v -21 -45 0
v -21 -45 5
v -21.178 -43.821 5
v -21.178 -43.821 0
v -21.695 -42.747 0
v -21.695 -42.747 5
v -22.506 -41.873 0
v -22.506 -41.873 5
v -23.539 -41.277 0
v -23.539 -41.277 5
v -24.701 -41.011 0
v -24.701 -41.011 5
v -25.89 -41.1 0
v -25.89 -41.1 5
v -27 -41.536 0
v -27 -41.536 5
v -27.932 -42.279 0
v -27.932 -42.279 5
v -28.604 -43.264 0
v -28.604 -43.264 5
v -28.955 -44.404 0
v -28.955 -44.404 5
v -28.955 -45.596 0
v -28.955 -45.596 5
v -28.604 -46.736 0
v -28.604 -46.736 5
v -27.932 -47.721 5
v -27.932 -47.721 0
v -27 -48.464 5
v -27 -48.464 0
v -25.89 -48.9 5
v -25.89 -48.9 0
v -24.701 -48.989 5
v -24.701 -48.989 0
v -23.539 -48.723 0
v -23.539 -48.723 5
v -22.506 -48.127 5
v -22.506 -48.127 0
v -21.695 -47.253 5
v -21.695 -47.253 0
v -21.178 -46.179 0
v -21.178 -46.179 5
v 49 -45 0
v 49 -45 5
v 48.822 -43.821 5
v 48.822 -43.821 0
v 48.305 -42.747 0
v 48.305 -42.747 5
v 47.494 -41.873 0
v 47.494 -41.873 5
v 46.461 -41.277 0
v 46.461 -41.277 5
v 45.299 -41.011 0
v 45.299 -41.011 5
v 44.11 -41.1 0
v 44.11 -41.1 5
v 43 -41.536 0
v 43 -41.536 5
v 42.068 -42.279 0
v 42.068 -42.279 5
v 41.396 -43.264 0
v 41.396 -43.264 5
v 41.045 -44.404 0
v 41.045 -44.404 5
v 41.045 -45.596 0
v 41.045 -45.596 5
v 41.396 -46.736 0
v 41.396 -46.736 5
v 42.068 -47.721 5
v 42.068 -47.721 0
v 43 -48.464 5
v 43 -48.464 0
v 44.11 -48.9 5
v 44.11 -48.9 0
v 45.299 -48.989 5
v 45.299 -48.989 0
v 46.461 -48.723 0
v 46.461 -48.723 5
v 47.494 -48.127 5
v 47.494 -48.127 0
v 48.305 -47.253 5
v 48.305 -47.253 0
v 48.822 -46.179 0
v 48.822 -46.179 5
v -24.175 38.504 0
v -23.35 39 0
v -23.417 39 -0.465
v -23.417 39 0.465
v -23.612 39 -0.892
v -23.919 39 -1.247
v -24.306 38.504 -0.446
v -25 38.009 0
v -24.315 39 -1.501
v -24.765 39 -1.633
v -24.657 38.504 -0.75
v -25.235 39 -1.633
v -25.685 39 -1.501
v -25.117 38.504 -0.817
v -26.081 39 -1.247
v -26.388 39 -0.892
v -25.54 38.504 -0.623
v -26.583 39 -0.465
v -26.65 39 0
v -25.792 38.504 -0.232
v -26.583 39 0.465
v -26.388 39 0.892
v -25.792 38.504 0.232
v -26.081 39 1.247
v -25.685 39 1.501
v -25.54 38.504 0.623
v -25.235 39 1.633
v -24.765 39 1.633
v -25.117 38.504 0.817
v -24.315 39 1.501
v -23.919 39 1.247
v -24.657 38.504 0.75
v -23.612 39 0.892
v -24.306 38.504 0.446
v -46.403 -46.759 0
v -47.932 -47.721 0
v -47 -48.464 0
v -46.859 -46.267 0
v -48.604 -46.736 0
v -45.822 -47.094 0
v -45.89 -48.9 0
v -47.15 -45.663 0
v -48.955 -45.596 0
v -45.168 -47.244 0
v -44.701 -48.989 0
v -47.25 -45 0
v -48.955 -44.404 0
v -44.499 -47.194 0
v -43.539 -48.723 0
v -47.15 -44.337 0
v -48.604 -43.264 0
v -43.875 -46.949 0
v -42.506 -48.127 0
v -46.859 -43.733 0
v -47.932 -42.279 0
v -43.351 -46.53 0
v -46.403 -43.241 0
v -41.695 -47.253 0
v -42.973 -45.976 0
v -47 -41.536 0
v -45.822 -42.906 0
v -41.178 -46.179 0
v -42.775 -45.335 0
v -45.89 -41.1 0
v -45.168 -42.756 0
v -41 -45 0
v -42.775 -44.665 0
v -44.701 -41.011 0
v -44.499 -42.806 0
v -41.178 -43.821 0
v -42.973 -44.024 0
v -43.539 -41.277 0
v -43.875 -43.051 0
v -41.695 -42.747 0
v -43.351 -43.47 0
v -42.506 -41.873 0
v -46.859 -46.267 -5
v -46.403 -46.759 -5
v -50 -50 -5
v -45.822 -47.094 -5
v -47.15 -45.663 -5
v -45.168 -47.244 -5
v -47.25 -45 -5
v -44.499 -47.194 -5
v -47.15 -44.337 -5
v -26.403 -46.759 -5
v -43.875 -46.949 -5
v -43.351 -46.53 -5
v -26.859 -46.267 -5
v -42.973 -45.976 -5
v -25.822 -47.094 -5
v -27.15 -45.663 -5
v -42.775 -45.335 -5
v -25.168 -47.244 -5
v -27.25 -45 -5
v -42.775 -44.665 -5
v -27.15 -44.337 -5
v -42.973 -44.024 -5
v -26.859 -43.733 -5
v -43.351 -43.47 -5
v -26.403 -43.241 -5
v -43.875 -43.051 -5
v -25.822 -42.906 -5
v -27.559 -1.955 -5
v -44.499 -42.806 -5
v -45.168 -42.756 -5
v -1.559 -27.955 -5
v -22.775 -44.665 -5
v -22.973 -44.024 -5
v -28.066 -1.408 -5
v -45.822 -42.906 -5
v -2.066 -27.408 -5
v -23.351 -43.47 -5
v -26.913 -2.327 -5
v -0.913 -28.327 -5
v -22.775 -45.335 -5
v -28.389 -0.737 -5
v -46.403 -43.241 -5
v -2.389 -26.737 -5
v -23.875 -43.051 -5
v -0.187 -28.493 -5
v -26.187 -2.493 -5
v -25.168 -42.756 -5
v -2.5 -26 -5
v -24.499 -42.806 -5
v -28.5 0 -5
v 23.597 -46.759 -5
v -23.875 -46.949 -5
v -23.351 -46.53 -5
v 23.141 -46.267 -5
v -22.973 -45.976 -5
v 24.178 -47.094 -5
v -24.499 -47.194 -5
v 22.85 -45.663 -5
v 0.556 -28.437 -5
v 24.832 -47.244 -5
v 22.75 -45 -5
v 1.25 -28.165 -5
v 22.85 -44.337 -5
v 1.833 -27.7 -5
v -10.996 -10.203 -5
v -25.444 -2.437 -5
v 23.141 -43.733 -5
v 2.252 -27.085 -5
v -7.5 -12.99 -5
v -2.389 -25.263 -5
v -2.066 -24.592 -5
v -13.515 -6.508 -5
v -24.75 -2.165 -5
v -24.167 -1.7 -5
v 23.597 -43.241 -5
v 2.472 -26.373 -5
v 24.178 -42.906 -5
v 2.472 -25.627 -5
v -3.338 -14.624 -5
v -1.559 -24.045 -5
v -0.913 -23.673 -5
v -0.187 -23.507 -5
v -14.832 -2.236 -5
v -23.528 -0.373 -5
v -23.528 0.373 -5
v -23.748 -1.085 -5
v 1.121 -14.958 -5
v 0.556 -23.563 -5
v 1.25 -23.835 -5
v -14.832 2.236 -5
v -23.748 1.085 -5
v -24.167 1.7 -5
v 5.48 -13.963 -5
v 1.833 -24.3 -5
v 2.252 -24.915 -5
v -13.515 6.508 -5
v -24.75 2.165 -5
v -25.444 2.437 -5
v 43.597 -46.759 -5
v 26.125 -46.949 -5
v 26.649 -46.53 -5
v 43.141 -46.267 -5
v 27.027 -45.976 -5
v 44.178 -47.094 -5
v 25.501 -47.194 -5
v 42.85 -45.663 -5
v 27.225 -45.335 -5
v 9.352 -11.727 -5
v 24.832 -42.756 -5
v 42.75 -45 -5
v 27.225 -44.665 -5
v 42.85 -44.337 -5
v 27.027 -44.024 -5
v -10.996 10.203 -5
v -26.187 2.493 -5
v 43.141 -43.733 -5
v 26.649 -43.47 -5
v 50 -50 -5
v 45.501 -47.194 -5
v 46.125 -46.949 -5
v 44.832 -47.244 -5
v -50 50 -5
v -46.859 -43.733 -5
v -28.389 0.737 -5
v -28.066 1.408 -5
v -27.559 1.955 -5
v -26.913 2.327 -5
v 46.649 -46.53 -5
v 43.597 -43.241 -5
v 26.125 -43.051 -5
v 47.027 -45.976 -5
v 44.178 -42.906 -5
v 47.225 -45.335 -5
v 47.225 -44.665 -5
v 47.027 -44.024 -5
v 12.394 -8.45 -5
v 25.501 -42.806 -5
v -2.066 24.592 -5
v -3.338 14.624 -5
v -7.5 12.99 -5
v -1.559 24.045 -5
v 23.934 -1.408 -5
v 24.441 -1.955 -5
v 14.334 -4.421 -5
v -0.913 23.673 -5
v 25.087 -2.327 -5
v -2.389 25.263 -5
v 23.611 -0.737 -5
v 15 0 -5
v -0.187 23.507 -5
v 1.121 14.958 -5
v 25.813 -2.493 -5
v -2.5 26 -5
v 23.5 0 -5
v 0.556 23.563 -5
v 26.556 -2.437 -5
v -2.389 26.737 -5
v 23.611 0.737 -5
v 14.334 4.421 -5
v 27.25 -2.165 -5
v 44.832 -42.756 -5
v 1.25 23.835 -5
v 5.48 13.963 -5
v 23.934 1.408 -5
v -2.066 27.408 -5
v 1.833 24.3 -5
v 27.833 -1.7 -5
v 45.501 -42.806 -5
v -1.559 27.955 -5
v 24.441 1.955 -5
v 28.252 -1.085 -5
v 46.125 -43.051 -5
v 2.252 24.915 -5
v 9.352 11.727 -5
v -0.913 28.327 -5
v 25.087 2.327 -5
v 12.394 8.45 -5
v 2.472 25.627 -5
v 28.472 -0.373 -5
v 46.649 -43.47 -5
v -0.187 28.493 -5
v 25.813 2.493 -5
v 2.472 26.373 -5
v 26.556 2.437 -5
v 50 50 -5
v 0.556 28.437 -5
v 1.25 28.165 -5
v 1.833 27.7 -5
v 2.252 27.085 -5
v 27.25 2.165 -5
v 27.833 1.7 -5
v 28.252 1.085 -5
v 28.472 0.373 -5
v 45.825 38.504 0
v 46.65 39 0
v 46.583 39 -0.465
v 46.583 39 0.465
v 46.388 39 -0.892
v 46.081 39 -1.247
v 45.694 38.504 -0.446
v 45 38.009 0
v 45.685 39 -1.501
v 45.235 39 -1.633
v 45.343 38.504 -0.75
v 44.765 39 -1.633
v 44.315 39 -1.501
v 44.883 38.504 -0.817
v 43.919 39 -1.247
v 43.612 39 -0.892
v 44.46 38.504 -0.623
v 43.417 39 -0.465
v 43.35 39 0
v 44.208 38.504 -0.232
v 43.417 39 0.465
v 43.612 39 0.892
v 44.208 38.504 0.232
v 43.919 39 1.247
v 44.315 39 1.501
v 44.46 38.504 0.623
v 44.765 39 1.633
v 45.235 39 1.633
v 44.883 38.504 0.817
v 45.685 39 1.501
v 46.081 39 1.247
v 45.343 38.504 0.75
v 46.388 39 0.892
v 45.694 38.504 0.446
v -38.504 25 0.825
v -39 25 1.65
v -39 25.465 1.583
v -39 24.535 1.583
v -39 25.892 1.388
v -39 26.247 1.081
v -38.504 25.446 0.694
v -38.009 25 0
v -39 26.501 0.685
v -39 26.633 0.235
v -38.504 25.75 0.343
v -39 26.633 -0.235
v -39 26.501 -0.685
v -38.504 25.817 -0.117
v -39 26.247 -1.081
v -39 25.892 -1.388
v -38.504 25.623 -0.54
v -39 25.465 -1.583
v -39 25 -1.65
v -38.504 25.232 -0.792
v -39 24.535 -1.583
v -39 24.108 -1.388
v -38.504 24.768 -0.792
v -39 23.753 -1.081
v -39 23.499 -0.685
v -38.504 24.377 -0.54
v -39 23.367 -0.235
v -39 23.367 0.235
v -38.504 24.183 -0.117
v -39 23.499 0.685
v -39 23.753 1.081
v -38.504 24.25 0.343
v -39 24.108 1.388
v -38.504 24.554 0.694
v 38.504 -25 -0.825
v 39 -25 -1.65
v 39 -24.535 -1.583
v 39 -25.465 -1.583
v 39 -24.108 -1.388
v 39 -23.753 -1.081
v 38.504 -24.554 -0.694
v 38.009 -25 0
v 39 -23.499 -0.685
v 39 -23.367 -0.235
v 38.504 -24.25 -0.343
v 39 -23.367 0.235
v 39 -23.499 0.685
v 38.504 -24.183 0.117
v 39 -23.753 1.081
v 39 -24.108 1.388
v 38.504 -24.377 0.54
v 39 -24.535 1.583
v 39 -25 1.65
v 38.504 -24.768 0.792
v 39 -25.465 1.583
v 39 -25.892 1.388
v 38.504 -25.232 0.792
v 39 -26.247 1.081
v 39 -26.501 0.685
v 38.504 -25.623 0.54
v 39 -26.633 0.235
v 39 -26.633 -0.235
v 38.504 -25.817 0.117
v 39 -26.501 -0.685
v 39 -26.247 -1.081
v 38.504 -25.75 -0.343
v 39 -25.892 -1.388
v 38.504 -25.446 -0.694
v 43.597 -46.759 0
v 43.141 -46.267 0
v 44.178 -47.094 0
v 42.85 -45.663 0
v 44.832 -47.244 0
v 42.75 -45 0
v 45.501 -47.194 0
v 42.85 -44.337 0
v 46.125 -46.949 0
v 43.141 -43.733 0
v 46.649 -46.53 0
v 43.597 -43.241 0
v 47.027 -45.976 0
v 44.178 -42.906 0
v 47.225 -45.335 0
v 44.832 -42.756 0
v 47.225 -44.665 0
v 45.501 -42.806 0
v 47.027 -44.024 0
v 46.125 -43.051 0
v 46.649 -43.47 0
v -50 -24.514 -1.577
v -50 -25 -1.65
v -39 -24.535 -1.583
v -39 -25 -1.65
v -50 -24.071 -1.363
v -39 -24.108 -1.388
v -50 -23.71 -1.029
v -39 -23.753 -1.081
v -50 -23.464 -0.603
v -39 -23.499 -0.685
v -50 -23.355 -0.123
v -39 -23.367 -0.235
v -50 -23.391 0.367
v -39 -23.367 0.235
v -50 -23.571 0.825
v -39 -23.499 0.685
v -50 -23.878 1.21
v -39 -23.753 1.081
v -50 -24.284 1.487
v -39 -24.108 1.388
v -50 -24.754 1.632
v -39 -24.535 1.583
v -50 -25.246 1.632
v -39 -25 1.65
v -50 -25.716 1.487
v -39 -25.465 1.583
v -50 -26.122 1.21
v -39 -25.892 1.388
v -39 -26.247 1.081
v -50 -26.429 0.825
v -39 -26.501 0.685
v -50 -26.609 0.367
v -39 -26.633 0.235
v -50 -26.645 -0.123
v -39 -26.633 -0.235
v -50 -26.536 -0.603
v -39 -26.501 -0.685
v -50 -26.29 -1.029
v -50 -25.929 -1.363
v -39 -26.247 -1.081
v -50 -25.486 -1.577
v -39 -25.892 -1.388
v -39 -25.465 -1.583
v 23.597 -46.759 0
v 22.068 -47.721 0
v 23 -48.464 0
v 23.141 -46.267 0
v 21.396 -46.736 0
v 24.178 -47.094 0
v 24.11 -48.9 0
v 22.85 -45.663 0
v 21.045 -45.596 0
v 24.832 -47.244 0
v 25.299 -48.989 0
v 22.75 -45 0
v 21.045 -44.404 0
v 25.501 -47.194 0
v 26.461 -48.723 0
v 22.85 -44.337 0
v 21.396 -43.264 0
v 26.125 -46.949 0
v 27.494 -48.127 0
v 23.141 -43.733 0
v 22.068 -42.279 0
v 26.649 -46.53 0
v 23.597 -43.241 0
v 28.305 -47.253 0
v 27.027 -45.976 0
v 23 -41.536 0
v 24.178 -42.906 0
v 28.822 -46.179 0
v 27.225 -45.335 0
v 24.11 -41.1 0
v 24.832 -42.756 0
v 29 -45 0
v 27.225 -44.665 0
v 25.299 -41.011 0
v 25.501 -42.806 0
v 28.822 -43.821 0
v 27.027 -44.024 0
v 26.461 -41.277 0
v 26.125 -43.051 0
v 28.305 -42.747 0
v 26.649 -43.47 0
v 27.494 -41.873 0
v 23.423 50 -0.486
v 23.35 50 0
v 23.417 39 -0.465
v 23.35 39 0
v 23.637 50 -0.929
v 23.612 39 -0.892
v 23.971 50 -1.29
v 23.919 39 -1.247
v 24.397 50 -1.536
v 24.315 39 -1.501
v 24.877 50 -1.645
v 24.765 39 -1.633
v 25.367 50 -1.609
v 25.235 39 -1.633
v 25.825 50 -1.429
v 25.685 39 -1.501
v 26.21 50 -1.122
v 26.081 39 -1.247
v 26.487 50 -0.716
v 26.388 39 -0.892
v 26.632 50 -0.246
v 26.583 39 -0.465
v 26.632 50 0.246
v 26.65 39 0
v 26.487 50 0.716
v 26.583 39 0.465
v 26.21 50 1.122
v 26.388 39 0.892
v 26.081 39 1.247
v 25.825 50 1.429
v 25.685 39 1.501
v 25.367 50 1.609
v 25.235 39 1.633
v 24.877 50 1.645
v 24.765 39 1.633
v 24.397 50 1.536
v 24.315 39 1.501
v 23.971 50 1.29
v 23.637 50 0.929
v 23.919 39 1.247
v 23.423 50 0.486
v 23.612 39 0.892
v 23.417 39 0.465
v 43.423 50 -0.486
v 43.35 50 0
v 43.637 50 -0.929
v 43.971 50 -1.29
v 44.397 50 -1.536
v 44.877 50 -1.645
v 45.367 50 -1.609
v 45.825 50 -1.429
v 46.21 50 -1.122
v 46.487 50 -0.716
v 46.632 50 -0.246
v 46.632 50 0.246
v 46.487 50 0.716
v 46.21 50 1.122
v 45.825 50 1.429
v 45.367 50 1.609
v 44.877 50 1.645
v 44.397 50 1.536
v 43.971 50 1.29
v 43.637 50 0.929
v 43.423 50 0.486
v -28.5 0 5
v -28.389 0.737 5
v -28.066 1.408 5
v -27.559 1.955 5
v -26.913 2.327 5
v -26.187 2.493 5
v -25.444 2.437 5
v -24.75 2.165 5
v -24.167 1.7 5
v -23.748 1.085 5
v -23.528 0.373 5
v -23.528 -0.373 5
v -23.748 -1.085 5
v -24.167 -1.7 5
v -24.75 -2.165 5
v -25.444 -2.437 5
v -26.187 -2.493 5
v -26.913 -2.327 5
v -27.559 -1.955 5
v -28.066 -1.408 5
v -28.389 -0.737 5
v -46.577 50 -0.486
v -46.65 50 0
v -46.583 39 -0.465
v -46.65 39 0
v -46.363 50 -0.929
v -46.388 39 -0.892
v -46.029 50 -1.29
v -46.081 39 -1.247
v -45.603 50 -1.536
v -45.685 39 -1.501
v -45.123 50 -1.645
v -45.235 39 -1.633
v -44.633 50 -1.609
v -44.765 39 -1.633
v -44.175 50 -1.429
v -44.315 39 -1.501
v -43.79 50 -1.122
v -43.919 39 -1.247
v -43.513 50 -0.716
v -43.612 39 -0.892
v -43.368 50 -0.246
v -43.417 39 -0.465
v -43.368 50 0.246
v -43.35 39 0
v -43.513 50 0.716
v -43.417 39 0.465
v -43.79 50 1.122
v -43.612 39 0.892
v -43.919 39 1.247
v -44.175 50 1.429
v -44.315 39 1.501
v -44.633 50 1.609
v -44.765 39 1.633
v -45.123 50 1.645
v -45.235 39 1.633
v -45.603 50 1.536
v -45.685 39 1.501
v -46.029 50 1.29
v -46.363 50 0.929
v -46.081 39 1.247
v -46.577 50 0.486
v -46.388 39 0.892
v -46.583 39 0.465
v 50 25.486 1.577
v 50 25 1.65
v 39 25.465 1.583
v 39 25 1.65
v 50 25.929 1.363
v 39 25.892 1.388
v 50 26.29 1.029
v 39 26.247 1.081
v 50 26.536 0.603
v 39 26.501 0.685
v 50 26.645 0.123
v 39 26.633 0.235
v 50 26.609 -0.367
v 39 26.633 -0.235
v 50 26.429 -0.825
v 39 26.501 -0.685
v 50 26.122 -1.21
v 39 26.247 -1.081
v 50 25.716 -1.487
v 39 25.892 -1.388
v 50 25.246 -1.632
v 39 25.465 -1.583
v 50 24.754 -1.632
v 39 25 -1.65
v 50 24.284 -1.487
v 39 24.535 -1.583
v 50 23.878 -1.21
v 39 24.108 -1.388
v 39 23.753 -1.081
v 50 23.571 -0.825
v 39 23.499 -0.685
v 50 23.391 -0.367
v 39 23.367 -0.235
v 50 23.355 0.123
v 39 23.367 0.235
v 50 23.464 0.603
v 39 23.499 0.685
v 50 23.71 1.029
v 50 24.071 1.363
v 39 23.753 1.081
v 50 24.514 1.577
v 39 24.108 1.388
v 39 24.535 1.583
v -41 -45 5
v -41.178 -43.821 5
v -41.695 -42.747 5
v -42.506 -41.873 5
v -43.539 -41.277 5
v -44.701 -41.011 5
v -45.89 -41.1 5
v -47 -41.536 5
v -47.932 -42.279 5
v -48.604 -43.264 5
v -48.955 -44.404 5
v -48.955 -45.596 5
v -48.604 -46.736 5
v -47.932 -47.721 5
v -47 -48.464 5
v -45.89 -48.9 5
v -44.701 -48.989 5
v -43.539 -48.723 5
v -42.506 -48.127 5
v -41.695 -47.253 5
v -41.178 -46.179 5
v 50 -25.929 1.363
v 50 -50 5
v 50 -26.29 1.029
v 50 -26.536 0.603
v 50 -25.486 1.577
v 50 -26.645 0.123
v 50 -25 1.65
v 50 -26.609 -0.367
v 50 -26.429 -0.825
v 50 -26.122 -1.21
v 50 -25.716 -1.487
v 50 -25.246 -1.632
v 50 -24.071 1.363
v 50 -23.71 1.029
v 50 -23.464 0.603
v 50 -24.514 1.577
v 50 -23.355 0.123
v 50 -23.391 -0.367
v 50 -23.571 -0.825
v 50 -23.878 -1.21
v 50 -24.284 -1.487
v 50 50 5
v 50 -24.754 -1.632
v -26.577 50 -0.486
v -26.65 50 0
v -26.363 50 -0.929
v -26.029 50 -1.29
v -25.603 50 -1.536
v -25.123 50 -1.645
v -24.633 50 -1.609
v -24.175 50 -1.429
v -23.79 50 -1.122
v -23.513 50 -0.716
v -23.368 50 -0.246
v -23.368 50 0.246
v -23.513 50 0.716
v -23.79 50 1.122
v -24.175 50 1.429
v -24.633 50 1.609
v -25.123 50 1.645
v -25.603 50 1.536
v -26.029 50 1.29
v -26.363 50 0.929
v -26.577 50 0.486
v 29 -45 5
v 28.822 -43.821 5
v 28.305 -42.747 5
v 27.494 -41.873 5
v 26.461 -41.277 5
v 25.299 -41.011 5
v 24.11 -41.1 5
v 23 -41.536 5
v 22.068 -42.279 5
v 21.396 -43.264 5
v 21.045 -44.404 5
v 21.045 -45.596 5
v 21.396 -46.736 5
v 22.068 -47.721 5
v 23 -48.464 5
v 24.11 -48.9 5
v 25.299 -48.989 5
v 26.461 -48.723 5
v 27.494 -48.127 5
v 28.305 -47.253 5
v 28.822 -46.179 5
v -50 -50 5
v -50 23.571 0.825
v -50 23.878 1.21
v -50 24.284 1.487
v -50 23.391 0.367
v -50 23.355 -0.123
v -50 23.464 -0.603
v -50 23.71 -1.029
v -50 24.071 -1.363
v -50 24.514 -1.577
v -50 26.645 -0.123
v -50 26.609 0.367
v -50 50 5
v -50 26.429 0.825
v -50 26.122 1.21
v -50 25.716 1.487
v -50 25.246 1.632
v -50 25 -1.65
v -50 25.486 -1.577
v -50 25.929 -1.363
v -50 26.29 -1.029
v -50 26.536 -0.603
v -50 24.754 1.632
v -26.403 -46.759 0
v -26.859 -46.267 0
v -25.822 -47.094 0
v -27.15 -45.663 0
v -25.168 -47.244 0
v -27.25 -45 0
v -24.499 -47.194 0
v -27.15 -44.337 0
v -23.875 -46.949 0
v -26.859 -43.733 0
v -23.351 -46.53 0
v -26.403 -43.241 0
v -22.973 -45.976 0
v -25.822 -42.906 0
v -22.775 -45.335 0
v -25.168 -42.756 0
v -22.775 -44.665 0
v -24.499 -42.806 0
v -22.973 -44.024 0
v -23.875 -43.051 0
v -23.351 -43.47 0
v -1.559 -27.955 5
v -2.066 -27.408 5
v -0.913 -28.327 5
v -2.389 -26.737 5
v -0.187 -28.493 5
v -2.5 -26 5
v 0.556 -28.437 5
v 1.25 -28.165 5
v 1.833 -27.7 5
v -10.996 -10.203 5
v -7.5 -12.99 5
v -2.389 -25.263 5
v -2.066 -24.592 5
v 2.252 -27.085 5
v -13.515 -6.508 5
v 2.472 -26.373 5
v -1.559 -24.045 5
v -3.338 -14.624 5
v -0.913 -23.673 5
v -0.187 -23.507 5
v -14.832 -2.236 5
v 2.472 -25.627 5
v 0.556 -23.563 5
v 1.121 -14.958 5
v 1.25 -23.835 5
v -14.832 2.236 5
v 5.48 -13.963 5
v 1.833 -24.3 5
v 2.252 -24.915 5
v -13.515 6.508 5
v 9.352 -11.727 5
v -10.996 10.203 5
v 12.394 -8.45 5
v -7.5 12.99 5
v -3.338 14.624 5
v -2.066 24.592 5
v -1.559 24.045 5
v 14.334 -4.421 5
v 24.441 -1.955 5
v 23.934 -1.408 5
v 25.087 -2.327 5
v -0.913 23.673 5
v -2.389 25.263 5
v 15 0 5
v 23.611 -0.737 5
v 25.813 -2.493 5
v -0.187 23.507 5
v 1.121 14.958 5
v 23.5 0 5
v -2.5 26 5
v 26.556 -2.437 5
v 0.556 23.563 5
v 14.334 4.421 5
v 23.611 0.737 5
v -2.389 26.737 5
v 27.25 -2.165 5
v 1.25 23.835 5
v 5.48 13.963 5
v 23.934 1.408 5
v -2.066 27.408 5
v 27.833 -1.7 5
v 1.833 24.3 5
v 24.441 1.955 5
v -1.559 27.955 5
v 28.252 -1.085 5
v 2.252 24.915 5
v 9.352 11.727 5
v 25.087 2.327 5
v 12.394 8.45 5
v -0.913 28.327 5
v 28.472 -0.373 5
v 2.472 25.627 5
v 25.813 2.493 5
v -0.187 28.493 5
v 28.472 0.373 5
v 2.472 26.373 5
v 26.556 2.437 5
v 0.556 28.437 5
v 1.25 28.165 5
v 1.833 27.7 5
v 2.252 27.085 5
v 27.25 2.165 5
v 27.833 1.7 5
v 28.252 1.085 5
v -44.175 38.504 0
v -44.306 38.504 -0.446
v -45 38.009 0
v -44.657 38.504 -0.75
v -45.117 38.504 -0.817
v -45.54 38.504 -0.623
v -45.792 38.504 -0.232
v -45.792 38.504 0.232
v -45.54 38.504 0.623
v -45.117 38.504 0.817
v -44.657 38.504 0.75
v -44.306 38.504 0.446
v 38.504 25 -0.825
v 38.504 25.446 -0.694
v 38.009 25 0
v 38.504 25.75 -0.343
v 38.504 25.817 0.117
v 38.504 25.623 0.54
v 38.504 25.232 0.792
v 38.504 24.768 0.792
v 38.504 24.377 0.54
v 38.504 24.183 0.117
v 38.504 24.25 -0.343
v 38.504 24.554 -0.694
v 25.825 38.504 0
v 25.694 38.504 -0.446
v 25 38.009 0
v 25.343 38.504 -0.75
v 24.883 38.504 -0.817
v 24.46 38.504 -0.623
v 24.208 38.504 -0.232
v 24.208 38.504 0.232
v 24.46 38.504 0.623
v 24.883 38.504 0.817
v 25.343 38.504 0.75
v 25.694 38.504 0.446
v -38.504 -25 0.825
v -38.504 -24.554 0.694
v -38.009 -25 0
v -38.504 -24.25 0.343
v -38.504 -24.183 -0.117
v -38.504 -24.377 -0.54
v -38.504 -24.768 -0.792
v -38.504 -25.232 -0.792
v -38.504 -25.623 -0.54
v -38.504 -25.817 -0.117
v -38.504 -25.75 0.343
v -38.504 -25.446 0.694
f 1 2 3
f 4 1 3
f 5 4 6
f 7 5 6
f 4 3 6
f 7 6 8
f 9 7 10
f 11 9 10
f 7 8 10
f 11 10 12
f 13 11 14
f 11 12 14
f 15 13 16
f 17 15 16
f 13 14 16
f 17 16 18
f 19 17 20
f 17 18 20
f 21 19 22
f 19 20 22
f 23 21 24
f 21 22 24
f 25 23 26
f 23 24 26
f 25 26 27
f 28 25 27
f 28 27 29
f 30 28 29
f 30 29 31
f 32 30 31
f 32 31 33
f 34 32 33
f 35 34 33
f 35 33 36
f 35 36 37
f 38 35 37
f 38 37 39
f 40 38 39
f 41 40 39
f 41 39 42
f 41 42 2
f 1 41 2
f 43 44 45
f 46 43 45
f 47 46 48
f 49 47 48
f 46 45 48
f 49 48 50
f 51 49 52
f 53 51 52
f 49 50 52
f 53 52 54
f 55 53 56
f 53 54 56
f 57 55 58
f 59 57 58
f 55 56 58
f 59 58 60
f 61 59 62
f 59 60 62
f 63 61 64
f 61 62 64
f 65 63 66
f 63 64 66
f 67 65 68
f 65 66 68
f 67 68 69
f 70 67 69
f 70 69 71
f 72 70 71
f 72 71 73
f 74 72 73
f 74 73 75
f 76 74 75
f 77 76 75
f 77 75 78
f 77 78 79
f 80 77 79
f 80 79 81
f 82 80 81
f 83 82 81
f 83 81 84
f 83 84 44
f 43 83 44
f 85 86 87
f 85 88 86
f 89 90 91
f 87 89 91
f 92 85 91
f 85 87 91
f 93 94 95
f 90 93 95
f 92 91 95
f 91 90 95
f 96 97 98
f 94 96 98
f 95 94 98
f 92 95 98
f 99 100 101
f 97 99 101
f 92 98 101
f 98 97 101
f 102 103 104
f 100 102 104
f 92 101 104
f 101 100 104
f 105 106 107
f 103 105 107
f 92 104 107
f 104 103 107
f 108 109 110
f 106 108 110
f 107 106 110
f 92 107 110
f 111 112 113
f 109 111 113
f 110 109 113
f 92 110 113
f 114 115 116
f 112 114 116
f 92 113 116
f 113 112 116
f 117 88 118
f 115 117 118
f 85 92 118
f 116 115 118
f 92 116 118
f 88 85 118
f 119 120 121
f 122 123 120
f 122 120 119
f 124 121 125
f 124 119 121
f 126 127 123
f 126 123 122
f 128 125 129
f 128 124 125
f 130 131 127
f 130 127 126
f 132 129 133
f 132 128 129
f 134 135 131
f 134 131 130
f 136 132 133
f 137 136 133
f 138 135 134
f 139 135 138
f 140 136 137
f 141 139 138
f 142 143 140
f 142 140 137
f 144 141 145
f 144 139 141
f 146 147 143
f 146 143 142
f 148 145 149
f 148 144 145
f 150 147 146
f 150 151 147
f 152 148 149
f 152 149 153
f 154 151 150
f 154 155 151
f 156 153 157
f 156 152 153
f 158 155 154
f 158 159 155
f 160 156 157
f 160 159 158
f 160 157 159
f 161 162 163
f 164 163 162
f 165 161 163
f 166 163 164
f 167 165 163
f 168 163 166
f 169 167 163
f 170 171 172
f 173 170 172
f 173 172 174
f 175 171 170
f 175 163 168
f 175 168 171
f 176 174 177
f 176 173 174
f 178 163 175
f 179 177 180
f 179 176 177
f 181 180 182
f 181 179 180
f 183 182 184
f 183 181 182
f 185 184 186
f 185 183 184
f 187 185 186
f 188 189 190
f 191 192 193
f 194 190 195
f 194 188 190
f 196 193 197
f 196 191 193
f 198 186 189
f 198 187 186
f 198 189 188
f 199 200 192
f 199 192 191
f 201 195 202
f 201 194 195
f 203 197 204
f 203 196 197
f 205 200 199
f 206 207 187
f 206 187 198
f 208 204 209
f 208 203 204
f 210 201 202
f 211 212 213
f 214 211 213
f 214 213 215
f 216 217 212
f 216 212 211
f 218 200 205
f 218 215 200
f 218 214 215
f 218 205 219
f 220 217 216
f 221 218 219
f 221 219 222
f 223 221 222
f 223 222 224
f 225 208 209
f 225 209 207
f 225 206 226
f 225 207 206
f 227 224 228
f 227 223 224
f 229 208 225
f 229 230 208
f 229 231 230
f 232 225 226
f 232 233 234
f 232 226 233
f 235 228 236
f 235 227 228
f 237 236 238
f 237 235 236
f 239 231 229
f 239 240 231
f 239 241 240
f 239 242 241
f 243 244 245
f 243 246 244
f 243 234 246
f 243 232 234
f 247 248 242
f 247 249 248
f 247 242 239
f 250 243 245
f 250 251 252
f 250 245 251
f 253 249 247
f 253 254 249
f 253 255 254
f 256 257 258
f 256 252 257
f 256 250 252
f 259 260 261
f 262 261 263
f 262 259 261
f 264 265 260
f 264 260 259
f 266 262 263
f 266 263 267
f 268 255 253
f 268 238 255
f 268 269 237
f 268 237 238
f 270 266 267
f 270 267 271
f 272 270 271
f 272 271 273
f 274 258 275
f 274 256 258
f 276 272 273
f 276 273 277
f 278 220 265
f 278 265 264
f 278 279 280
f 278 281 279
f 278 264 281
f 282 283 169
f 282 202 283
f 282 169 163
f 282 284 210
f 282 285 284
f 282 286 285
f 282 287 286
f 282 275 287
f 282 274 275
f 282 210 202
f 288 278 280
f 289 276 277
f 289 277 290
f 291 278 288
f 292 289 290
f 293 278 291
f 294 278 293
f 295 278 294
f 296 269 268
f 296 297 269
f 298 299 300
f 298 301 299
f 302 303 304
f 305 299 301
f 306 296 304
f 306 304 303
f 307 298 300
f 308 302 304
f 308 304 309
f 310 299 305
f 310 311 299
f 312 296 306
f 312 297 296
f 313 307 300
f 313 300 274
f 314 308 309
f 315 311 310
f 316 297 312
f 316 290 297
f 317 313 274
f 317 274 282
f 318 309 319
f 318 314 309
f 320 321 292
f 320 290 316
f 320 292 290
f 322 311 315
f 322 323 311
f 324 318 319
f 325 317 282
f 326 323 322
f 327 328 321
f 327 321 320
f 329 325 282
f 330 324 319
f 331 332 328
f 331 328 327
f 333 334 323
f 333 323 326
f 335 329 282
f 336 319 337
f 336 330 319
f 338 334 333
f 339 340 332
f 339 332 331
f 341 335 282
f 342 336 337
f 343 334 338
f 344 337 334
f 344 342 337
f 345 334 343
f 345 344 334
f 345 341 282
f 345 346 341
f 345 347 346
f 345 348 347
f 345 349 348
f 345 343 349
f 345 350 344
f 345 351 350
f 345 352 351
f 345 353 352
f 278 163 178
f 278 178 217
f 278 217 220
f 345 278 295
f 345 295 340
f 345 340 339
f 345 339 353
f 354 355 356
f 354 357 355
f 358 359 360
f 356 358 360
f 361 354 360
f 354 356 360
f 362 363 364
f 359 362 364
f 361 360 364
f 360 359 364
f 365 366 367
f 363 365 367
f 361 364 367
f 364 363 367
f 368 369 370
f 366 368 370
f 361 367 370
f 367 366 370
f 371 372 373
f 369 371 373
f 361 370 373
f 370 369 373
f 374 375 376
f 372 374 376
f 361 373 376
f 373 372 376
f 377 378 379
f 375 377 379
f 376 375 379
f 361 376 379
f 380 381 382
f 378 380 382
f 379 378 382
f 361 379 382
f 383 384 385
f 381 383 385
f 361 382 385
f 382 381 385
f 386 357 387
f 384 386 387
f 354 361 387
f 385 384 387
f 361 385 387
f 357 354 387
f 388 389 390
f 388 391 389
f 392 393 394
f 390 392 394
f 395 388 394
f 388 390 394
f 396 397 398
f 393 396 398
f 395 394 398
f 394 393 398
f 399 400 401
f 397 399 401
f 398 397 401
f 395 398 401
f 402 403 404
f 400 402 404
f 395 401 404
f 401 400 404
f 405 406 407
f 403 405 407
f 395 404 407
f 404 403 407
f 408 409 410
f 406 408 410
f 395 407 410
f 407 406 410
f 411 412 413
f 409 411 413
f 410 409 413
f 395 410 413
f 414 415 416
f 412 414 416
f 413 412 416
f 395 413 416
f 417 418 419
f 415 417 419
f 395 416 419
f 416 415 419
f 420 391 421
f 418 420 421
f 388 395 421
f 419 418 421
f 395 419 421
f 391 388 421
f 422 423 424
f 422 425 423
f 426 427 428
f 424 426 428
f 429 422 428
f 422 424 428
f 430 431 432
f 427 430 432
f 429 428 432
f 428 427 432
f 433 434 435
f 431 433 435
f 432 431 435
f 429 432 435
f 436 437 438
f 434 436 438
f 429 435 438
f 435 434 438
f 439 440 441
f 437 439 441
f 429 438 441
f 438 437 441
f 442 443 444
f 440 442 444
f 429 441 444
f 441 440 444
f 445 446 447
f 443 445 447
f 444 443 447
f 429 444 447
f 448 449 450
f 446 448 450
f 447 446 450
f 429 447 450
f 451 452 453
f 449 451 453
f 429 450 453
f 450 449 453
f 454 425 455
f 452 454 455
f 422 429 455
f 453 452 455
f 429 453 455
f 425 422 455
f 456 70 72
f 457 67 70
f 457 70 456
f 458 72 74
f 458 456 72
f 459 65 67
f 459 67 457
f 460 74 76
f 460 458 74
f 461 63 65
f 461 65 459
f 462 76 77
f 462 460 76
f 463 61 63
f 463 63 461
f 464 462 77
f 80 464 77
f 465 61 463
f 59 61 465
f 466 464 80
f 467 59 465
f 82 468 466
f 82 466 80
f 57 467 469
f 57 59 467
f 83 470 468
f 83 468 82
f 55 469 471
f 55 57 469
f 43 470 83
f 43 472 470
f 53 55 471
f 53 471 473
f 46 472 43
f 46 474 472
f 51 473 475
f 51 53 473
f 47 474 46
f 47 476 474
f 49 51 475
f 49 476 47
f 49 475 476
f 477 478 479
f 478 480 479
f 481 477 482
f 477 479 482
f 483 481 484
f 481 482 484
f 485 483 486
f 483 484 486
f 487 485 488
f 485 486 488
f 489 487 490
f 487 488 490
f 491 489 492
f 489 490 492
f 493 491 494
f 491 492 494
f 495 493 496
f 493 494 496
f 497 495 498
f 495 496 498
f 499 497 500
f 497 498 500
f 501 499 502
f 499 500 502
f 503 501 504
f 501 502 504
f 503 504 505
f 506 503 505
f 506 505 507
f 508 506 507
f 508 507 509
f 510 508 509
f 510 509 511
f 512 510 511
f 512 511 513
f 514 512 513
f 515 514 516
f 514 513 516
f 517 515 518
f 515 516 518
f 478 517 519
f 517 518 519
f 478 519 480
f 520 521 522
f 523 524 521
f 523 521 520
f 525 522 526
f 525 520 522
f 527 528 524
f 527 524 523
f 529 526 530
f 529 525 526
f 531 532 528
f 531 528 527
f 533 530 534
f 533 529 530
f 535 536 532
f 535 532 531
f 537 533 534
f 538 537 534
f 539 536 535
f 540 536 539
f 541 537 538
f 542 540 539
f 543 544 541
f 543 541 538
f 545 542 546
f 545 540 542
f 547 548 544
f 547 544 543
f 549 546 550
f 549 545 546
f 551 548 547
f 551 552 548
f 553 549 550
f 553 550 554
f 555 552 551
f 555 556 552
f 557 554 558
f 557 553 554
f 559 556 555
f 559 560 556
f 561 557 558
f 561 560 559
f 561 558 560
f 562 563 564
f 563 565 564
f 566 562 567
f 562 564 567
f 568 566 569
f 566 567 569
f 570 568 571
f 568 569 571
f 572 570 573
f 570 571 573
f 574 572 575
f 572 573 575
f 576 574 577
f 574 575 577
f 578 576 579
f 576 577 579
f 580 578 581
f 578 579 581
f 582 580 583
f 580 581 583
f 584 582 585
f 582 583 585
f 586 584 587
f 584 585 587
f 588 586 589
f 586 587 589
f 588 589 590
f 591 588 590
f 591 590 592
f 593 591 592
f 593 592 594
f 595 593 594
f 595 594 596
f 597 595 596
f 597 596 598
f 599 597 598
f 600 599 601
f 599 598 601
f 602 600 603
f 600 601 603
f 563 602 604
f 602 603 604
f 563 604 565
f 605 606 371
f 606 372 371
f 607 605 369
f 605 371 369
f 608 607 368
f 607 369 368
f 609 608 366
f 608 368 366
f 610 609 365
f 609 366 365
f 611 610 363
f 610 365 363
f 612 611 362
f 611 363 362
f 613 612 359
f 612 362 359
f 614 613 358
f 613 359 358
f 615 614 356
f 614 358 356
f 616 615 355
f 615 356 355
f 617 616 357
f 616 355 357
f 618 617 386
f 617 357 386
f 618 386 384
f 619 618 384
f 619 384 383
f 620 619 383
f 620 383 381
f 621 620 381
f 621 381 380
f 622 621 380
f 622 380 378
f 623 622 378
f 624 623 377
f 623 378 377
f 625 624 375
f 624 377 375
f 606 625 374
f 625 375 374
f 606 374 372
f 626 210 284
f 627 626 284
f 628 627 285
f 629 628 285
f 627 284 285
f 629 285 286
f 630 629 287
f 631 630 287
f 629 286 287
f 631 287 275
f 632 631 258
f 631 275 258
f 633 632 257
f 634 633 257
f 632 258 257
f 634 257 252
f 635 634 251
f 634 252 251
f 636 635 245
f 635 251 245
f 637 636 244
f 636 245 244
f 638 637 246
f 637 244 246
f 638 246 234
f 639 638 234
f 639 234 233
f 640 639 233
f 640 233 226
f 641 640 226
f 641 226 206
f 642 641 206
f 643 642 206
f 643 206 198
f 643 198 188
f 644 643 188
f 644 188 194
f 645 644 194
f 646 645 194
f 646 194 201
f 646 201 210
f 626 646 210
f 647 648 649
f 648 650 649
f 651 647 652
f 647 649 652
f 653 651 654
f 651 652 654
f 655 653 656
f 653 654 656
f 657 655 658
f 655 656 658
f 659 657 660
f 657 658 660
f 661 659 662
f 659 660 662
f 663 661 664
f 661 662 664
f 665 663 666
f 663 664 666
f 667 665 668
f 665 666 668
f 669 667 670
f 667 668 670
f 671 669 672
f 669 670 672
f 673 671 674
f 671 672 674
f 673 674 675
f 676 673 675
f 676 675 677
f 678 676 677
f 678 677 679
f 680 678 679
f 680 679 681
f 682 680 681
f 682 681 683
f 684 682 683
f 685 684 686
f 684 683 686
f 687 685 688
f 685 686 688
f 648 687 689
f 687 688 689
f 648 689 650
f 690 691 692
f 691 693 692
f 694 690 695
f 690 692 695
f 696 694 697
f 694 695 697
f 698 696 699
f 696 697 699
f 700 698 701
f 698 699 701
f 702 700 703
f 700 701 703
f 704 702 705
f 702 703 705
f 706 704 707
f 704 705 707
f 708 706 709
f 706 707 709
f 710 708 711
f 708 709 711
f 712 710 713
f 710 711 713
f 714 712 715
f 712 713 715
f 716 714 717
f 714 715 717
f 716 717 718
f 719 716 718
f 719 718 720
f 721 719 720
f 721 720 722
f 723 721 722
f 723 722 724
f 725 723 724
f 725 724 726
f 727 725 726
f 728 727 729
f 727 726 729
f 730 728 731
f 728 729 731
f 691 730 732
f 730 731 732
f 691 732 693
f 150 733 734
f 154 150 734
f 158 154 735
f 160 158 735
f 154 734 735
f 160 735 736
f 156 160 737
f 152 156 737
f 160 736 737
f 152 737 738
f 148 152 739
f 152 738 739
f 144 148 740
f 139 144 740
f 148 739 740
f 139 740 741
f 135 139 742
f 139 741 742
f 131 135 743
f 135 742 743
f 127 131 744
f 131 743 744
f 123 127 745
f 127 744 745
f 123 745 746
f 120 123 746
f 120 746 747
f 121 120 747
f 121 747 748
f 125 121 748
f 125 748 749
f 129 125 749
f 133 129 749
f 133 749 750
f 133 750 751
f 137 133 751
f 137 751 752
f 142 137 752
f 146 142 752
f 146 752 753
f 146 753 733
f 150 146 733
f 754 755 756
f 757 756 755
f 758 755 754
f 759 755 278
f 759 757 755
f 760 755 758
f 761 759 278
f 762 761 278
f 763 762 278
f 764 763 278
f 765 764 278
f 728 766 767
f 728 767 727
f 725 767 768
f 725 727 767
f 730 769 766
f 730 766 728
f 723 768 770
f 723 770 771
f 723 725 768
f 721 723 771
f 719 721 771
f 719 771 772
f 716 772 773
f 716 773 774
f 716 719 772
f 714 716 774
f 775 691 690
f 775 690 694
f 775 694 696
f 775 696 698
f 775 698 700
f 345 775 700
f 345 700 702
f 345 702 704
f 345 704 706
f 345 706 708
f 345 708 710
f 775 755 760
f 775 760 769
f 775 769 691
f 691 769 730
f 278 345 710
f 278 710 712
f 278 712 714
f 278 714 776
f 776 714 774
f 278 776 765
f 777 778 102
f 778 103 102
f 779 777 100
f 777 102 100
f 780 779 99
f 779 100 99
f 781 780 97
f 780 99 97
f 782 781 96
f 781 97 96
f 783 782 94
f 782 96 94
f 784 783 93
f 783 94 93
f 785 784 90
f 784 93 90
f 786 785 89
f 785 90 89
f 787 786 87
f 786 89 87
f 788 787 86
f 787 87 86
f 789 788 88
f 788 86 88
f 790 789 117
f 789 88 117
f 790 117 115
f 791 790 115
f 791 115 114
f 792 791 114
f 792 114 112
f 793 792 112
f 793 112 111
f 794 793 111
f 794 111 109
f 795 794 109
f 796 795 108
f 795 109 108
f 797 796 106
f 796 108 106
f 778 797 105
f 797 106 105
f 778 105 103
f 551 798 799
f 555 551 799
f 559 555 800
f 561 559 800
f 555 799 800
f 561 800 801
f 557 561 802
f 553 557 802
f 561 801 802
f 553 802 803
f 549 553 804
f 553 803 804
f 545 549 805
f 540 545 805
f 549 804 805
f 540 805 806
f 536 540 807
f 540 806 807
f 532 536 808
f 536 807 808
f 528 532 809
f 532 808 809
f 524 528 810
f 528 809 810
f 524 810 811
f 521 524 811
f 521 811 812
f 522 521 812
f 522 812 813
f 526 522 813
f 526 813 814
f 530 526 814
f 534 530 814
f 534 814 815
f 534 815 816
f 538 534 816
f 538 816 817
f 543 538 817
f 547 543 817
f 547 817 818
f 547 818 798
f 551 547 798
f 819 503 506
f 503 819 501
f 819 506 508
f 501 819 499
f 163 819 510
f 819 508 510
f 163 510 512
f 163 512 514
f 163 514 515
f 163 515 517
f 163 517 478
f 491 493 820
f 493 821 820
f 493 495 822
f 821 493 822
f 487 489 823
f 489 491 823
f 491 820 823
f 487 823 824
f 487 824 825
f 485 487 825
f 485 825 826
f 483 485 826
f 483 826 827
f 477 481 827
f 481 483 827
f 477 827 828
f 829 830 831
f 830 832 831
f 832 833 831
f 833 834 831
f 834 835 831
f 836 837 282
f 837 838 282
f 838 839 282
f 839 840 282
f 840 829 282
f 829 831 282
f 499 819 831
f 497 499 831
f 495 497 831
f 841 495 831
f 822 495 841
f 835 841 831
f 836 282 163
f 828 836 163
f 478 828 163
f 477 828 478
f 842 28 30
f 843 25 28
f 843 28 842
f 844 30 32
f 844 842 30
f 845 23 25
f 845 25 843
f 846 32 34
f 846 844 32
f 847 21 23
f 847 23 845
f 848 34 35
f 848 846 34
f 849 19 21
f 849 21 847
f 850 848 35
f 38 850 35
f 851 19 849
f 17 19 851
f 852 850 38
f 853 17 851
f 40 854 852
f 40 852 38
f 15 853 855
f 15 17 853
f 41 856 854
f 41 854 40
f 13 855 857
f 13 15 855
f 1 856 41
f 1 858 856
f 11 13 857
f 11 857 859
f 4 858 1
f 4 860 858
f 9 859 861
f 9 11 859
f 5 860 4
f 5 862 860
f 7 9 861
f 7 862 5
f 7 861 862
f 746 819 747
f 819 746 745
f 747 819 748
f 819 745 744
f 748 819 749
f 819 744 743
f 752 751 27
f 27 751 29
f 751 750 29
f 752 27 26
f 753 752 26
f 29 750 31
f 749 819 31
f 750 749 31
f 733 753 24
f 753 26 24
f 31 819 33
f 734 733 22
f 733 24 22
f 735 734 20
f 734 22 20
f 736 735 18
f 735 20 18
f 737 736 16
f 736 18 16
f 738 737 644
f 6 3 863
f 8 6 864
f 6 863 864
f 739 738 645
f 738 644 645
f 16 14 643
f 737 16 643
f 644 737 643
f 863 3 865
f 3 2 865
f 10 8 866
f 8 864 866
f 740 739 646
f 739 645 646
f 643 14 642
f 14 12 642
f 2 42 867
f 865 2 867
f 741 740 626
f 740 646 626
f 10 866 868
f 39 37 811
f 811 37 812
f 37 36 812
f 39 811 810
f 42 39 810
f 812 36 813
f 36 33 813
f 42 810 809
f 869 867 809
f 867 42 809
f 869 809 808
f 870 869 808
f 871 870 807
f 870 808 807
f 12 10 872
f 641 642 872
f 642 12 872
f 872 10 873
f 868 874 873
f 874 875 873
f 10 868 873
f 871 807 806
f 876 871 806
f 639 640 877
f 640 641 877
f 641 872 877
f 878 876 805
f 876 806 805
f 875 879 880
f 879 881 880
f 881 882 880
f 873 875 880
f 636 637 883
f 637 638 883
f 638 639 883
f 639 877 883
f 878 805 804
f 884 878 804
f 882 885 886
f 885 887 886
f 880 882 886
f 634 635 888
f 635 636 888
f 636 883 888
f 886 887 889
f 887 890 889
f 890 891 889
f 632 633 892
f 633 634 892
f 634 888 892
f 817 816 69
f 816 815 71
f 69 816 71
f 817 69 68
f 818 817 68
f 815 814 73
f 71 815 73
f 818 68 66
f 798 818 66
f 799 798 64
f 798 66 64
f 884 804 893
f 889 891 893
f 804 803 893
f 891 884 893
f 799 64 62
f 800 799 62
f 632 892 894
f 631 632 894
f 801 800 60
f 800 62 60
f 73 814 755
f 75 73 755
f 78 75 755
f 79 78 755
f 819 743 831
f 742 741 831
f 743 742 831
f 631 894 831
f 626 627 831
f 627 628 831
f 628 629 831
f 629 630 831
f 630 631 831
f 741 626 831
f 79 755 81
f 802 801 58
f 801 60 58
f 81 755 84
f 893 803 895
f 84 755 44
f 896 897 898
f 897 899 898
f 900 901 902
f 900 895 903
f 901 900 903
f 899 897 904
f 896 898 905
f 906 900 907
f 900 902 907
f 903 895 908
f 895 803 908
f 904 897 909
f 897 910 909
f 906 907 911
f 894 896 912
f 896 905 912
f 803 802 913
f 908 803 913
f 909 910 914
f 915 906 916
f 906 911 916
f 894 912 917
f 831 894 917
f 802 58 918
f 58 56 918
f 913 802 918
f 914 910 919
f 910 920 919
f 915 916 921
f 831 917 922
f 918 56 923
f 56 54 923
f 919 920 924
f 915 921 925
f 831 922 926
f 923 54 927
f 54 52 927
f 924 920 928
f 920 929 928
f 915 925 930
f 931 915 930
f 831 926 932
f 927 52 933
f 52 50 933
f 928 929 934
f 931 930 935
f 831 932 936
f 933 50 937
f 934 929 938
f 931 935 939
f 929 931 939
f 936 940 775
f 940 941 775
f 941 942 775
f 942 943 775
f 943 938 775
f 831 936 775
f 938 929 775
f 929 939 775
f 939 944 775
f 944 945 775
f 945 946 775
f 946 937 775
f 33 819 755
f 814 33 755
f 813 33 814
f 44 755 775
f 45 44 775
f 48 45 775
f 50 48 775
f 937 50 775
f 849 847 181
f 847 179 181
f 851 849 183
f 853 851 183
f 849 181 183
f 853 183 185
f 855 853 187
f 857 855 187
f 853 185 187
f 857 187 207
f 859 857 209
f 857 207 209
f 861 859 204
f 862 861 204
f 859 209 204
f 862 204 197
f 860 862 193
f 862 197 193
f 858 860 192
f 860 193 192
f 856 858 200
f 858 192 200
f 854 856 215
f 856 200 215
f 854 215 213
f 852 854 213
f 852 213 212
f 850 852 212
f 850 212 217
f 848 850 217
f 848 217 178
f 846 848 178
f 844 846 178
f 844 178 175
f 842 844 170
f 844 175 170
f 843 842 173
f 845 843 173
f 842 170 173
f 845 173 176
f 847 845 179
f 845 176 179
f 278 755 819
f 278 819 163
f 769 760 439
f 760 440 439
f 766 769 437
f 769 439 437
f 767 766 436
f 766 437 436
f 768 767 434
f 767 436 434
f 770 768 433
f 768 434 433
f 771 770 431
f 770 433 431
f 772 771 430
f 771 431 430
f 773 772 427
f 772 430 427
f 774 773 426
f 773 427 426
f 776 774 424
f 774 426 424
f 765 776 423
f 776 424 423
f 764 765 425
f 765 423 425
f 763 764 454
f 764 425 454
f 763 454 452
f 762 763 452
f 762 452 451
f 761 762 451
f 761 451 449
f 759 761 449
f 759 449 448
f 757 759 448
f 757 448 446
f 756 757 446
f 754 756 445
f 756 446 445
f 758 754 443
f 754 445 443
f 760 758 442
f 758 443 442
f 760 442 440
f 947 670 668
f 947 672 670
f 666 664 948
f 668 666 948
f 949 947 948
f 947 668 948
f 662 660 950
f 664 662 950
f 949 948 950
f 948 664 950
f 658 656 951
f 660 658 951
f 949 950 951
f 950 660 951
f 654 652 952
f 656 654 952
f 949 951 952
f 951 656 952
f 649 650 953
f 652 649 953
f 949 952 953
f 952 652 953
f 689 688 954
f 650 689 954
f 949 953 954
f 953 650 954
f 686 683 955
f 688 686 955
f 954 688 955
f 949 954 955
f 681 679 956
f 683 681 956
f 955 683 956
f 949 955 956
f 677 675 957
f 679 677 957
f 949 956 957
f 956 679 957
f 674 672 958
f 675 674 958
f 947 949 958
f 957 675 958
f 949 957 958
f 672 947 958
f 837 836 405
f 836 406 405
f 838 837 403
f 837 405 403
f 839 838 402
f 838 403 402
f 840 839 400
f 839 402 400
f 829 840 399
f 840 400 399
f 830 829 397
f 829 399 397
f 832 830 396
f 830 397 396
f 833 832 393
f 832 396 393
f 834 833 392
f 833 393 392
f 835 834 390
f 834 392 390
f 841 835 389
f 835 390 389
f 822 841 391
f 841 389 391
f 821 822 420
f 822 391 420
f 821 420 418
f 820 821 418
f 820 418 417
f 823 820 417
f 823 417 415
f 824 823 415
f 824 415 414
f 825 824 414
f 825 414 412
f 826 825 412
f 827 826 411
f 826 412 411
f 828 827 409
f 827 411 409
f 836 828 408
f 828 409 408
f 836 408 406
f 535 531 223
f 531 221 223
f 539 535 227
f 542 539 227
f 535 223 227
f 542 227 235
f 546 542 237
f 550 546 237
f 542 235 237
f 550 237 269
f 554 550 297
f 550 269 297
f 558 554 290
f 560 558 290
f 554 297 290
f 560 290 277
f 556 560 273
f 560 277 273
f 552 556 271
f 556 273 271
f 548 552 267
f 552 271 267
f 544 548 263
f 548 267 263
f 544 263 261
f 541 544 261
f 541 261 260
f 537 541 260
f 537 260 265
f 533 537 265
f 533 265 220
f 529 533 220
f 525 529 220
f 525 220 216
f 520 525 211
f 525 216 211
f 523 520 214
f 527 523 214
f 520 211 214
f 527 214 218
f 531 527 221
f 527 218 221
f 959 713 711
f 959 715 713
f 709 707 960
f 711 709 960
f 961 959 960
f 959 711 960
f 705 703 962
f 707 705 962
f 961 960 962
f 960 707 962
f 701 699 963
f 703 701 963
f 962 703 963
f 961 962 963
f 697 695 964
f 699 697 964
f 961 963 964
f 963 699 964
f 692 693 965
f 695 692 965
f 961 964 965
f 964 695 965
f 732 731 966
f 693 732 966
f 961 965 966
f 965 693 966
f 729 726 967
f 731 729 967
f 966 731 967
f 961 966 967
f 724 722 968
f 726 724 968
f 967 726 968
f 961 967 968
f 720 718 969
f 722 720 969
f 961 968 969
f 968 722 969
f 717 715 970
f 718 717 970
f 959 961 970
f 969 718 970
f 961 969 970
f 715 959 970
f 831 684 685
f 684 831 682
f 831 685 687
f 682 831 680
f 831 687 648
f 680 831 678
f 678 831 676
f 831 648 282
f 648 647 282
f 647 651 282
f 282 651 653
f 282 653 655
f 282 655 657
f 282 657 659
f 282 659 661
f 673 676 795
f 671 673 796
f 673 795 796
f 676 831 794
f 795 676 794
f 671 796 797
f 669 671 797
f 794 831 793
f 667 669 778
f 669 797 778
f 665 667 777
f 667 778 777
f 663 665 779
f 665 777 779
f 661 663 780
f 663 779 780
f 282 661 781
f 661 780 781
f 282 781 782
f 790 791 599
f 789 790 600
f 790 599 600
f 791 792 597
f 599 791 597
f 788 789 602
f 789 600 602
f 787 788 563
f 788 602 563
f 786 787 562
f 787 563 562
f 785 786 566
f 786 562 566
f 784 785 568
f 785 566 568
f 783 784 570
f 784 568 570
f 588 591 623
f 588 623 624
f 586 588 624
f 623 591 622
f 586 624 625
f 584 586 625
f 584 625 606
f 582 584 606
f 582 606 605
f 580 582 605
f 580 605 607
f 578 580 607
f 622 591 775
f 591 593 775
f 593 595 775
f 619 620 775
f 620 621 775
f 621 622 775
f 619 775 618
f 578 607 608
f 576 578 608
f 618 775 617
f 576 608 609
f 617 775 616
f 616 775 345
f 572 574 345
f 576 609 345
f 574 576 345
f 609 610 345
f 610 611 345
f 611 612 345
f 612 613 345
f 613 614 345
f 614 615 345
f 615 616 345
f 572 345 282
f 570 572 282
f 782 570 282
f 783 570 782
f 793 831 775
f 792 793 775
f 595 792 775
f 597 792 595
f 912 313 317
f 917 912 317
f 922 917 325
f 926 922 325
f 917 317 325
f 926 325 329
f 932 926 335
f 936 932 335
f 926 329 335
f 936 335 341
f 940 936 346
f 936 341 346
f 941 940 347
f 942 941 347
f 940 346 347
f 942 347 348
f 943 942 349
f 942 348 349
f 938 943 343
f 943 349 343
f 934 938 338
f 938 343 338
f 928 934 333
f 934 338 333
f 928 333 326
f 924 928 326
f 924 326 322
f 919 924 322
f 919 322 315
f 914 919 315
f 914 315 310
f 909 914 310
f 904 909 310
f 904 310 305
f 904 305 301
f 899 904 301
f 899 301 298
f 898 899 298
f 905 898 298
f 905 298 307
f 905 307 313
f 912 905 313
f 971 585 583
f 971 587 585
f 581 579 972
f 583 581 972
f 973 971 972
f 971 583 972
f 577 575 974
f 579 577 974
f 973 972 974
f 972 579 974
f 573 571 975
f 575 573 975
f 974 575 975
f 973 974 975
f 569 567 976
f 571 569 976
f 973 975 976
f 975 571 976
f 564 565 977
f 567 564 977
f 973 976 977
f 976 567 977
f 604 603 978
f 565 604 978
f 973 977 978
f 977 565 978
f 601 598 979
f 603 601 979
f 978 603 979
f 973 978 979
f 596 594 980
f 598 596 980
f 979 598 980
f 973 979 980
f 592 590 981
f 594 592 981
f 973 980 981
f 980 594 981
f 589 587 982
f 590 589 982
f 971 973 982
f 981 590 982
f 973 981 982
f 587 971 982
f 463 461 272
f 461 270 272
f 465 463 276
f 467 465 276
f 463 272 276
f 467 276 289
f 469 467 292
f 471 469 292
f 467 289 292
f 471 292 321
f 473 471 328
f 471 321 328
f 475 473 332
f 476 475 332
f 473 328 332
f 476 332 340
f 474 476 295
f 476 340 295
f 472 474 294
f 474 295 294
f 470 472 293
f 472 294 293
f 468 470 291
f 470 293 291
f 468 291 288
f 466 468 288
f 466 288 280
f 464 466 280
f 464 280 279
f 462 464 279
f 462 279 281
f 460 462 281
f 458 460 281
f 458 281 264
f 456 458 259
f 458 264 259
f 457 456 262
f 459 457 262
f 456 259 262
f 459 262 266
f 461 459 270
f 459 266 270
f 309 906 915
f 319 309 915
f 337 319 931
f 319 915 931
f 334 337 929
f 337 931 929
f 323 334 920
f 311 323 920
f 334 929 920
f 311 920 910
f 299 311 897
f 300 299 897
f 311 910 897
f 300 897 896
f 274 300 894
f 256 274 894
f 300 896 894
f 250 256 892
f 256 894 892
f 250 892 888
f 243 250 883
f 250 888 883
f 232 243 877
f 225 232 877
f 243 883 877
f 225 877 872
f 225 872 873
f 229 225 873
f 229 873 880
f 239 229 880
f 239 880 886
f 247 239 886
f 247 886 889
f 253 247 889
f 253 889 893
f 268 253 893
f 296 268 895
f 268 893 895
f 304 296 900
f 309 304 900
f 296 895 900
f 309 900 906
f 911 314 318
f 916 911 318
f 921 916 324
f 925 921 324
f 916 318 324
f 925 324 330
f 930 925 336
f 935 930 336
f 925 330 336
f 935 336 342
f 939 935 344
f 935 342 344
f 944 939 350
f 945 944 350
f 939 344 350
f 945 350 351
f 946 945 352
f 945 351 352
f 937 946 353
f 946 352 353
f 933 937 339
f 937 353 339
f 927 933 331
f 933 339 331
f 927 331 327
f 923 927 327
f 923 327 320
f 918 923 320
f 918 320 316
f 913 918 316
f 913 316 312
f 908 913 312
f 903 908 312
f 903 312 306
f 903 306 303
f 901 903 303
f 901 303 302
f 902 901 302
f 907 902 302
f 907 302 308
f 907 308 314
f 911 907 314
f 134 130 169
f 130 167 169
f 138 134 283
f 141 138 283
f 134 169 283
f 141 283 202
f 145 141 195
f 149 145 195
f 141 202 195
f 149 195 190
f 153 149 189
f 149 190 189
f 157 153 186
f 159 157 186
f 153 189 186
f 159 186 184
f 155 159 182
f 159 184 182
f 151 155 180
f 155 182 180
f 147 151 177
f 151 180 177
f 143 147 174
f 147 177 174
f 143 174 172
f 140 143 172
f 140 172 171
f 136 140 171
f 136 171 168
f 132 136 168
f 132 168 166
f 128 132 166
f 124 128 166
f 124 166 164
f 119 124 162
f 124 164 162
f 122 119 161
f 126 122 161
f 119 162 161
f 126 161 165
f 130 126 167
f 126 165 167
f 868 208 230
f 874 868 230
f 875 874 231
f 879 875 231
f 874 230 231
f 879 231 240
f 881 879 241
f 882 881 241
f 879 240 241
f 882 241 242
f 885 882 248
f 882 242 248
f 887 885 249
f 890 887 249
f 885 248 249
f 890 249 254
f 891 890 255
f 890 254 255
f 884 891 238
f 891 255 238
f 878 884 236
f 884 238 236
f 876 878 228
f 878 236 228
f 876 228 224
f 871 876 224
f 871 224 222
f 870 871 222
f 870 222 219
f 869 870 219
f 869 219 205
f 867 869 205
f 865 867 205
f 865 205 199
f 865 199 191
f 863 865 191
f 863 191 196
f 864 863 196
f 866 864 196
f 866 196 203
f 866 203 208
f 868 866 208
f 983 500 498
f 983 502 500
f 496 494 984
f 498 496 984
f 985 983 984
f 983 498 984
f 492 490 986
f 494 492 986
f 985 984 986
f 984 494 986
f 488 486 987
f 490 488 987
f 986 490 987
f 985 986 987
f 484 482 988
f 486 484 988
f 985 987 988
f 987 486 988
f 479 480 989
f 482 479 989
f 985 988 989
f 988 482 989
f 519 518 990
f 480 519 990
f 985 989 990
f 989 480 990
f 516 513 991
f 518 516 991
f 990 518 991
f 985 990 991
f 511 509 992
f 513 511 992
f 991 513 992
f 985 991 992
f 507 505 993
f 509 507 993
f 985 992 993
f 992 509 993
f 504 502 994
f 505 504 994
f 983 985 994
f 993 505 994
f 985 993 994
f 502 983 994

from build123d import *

# Parameters (mm, degrees)
SKETCH1_W                                           = 10
SKETCH1_H                                           = 100
BOSS_EXTRUDE1_DEPTH                                 = 50
SKETCH2_R                                           = 15
CUT_EXTRUDE1_DEPTH                                  = 10
CBORE_FOR_M4_HEX_SOCKET_HEAD_CAP_SCREW1_D           = 4.5
CBORE_FOR_M4_HEX_SOCKET_HEAD_CAP_SCREW1_CBORE_D     = 8
CBORE_FOR_M4_HEX_SOCKET_HEAD_CAP_SCREW1_CBORE_DEPTH = 5
M4_TAPPED_HOLE1_D                                   = 3.3
M4_TAPPED_HOLE1_DEPTH                               = 11
M4_TAPPED_HOLE1_TIP                                 = 0.991420021
M4_TAPPED_HOLE2_D                                   = 3.3
M4_TAPPED_HOLE2_DEPTH                               = 11
M4_TAPPED_HOLE2_TIP                                 = 0.991420021
M4_TAPPED_HOLE3_D                                   = 3.3
M4_TAPPED_HOLE3_DEPTH                               = 11
M4_TAPPED_HOLE3_TIP                                 = 0.991420021
M6_TAPPED_HOLE1_D                                   = 5


with BuildPart() as part:
    # Sketch1 → Boss-Extrude1 (new, symmetric)
    with BuildSketch(Plane(origin=(0, 0, 0), x_dir=(0, 0, -1), z_dir=(1, 0, 0))):
        Rectangle(SKETCH1_W, SKETCH1_H)
    extrude(amount=BOSS_EXTRUDE1_DEPTH, both=True)

    # Sketch2 → Cut-Extrude1 (cut)
    with BuildSketch(Plane.XY.offset(5)):
        Circle(SKETCH2_R)
    extrude(amount=-CUT_EXTRUDE1_DEPTH, mode=Mode.SUBTRACT)

    # CBORE for M4 Hex Socket Head Cap Screw1 (through all)
    with Locations(Plane.XY.offset(5)):
        with Locations((-45, -45), (-25, -45), (25, -45), (45, -45)):
            CounterBoreHole(CBORE_FOR_M4_HEX_SOCKET_HEAD_CAP_SCREW1_D / 2, CBORE_FOR_M4_HEX_SOCKET_HEAD_CAP_SCREW1_CBORE_D / 2, CBORE_FOR_M4_HEX_SOCKET_HEAD_CAP_SCREW1_CBORE_DEPTH)

    # M4 Tapped Hole1
    with Locations(Plane(origin=(0, 50, 0), x_dir=(1, 0, 0), z_dir=(0, 1, 0))):
        with Locations((-45, 0), (-25, 0), (25, 0), (45, 0)):
            Hole(M4_TAPPED_HOLE1_D / 2, depth=M4_TAPPED_HOLE1_DEPTH)
            with Locations((0, 0, -(M4_TAPPED_HOLE1_DEPTH + M4_TAPPED_HOLE1_TIP / 2))):  # 118° drill point
                Cone(0, M4_TAPPED_HOLE1_D / 2, M4_TAPPED_HOLE1_TIP, mode=Mode.SUBTRACT)

    # M4 Tapped Hole2
    with Locations(Plane.ZY.offset(50)):
        with Locations((0, 25), (0, -25)):
            Hole(M4_TAPPED_HOLE2_D / 2, depth=M4_TAPPED_HOLE2_DEPTH)
            with Locations((0, 0, -(M4_TAPPED_HOLE2_DEPTH + M4_TAPPED_HOLE2_TIP / 2))):  # 118° drill point
                Cone(0, M4_TAPPED_HOLE2_D / 2, M4_TAPPED_HOLE2_TIP, mode=Mode.SUBTRACT)

    # M4 Tapped Hole3
    with Locations(Plane(origin=(50, 0, 0), x_dir=(0, 0, -1), z_dir=(1, 0, 0))):
        with Locations((0, 25), (0, -25)):
            Hole(M4_TAPPED_HOLE3_D / 2, depth=M4_TAPPED_HOLE3_DEPTH)
            with Locations((0, 0, -(M4_TAPPED_HOLE3_DEPTH + M4_TAPPED_HOLE3_TIP / 2))):  # 118° drill point
                Cone(0, M4_TAPPED_HOLE3_D / 2, M4_TAPPED_HOLE3_TIP, mode=Mode.SUBTRACT)

    # M6 Tapped Hole1 (through all)
    with Locations(Plane.XY.offset(5)):
        with Locations((0, 26), (-26, 0), (26, 0), (0, -26)):
            Hole(M6_TAPPED_HOLE1_D / 2)


solid = part.part
